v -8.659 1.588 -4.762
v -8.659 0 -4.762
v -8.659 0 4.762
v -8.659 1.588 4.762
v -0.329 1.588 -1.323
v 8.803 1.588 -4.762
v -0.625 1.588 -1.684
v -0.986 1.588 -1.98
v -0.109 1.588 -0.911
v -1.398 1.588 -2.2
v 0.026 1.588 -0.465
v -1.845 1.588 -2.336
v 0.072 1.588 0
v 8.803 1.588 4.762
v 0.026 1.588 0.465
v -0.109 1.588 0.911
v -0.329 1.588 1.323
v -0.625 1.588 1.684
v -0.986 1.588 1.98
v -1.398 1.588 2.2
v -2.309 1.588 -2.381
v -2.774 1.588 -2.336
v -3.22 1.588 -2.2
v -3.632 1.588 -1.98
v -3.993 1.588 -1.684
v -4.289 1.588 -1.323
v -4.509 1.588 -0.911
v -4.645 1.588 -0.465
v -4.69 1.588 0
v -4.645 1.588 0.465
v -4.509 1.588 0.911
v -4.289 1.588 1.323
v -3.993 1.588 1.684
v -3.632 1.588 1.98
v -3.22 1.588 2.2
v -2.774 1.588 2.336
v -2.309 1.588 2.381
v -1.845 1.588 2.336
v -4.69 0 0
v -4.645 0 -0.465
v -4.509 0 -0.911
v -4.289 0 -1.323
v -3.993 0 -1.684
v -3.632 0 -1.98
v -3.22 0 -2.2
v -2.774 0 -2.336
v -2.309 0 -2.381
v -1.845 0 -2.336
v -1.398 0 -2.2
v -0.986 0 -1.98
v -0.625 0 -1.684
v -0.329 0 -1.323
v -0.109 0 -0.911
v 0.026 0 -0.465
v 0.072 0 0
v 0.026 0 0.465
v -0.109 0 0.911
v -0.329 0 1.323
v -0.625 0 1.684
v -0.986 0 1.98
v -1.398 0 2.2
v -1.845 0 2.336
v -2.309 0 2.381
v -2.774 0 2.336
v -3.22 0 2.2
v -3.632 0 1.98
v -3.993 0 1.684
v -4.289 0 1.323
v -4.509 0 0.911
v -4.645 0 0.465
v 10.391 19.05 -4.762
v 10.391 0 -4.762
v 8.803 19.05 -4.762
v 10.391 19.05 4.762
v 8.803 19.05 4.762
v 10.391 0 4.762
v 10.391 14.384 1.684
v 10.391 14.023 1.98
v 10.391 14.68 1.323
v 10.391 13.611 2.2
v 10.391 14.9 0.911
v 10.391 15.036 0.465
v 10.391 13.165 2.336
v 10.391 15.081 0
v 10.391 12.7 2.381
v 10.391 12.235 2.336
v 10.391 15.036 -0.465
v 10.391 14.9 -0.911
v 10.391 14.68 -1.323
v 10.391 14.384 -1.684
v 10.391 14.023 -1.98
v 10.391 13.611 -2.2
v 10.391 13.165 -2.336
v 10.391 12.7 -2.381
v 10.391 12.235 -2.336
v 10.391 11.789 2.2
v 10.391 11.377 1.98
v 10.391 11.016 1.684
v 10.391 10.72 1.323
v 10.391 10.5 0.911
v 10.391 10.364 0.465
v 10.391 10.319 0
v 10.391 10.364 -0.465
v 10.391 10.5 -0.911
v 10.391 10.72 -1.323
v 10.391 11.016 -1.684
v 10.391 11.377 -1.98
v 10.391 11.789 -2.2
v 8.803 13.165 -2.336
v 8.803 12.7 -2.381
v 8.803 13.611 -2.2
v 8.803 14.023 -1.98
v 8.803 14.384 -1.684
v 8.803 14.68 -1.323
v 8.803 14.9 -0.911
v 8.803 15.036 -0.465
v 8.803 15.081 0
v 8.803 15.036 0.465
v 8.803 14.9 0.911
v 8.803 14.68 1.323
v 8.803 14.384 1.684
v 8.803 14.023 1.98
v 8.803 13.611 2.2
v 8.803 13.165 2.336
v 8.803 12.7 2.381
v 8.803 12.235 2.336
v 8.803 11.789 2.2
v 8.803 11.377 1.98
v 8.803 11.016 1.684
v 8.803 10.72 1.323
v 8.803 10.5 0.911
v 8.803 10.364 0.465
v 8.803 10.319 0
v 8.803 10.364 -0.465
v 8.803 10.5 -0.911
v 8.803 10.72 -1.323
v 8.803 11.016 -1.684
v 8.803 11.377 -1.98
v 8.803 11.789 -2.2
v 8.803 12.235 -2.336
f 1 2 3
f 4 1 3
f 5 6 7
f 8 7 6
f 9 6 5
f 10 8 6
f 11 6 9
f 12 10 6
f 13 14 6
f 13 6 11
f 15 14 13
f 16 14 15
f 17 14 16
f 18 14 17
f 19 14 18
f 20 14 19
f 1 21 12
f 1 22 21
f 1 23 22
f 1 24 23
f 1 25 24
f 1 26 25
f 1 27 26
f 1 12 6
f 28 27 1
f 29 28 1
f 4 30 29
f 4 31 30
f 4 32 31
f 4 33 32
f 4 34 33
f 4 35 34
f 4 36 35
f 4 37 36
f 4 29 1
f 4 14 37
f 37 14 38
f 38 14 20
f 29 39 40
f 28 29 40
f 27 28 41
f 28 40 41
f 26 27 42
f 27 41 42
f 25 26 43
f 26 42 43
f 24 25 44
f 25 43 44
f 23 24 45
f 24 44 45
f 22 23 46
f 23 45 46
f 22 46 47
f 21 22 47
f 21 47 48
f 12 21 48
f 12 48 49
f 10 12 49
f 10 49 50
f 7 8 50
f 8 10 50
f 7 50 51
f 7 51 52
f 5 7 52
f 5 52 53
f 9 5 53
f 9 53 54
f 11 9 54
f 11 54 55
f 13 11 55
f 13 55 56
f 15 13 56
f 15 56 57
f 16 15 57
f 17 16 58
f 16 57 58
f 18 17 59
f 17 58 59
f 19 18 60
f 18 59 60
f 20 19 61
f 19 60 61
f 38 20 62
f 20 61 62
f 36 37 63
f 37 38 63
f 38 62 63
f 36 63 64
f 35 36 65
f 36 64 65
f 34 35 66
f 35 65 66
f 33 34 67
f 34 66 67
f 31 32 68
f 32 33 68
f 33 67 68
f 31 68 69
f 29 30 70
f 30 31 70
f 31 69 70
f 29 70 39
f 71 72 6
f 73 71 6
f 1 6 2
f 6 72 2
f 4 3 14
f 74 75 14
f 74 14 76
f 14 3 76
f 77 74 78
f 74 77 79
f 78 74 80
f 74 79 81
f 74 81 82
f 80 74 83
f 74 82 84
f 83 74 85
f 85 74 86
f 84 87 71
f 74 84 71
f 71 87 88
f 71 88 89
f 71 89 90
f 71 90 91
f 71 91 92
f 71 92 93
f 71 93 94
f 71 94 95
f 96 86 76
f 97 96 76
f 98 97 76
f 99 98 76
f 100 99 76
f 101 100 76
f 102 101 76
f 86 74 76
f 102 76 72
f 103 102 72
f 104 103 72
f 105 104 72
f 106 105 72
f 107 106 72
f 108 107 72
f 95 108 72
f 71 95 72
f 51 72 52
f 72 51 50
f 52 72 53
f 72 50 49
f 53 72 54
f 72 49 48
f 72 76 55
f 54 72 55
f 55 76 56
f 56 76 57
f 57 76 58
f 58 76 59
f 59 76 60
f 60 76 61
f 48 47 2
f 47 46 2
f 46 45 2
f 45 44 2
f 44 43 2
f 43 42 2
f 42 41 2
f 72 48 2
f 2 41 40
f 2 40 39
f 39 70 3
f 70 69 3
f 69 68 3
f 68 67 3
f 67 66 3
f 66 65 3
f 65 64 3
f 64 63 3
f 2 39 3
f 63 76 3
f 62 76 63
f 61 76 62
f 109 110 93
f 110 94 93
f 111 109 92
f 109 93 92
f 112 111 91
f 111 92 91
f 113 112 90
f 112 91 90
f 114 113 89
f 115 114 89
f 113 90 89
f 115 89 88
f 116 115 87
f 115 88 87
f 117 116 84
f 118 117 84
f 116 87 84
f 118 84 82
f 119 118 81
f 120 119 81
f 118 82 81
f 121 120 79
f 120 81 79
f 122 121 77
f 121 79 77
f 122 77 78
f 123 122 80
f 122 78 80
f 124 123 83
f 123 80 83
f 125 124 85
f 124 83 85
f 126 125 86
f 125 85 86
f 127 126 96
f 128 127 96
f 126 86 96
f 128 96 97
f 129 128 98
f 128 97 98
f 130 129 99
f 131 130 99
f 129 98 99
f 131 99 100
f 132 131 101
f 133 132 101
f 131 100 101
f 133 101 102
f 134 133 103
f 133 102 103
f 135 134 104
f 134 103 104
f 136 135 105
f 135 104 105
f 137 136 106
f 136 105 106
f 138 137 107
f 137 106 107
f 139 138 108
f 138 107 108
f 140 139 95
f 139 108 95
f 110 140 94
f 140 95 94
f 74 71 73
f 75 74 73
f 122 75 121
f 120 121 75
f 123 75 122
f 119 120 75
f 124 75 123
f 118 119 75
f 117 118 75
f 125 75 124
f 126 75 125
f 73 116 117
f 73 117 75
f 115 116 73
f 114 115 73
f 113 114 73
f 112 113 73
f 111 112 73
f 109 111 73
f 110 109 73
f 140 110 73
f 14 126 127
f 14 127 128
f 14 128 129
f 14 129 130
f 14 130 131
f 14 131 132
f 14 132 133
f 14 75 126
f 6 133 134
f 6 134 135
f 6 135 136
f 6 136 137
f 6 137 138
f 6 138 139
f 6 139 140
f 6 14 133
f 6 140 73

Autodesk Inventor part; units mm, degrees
ref_plane "YZ Plane" through (0, 0, 0) normal (1, 0, 0) x (0, 1, 0)
ref_plane "XZ Plane" through (0, 0, 0) normal (0, 1, 0) x (-1, 0, 0)
ref_plane "XY Plane" through (0, 0, 0) normal (0, 0, 1) x (1, 0, 0)
sketch "Sketch1" plane through (0, 0, 0) normal (0, 1, 0) x (-1, 0, 0)
  line L0 (8.6591, 4.7625) -> (-10.3909, 4.7625)
  line L1 (-10.3909, 4.7625) -> (-10.3909, -4.7625)
  line L2 (-10.3909, -4.7625) -> (8.6591, -4.7625)
  line L3 (8.6591, -4.7625) -> (8.6591, 4.7625)
  circle A0 centre (2.3091, 0) radius 2.3813
  line L4 (-10.3909, 4.7625) -> (-8.8034, 4.7625)
  line L5 (-8.8034, 4.7625) -> (-8.8034, -4.7625)
  line L6 (-8.8034, -4.7625) -> (-10.3909, -4.7625)
  line L7 (-10.3909, -4.7625) -> (-10.3909, 4.7625)
  point P0 (0, 0)
  dimension "d0" = 19.05
  dimension "d1" = 9.525
  dimension "d3" = 4.7625
  dimension "d4" = 12.7
  dimension "d5" = 1.5875
extrude "Extrusion1" add sketch "Sketch1" along normal blind 1.5875 contours L3 L2 L5 L0
extrude "Extrusion2" add sketch "Sketch1" along normal blind 19.05 contours L5 L2 L1 L0
sketch "Sketch2" plane through (10.3909, 0, 4.7625) normal (1, 0, 0) x (0, 0, -1)
  circle A0 centre (4.7625, 12.7) radius 2.3813
  point P0 (4.7625, 0)
  dimension "d10" = 12.7
  dimension "d11" = 4.7625
extrude "Extrusion3" cut sketch "Sketch2" against normal blind 1.5875
properties part number "LBlock"
